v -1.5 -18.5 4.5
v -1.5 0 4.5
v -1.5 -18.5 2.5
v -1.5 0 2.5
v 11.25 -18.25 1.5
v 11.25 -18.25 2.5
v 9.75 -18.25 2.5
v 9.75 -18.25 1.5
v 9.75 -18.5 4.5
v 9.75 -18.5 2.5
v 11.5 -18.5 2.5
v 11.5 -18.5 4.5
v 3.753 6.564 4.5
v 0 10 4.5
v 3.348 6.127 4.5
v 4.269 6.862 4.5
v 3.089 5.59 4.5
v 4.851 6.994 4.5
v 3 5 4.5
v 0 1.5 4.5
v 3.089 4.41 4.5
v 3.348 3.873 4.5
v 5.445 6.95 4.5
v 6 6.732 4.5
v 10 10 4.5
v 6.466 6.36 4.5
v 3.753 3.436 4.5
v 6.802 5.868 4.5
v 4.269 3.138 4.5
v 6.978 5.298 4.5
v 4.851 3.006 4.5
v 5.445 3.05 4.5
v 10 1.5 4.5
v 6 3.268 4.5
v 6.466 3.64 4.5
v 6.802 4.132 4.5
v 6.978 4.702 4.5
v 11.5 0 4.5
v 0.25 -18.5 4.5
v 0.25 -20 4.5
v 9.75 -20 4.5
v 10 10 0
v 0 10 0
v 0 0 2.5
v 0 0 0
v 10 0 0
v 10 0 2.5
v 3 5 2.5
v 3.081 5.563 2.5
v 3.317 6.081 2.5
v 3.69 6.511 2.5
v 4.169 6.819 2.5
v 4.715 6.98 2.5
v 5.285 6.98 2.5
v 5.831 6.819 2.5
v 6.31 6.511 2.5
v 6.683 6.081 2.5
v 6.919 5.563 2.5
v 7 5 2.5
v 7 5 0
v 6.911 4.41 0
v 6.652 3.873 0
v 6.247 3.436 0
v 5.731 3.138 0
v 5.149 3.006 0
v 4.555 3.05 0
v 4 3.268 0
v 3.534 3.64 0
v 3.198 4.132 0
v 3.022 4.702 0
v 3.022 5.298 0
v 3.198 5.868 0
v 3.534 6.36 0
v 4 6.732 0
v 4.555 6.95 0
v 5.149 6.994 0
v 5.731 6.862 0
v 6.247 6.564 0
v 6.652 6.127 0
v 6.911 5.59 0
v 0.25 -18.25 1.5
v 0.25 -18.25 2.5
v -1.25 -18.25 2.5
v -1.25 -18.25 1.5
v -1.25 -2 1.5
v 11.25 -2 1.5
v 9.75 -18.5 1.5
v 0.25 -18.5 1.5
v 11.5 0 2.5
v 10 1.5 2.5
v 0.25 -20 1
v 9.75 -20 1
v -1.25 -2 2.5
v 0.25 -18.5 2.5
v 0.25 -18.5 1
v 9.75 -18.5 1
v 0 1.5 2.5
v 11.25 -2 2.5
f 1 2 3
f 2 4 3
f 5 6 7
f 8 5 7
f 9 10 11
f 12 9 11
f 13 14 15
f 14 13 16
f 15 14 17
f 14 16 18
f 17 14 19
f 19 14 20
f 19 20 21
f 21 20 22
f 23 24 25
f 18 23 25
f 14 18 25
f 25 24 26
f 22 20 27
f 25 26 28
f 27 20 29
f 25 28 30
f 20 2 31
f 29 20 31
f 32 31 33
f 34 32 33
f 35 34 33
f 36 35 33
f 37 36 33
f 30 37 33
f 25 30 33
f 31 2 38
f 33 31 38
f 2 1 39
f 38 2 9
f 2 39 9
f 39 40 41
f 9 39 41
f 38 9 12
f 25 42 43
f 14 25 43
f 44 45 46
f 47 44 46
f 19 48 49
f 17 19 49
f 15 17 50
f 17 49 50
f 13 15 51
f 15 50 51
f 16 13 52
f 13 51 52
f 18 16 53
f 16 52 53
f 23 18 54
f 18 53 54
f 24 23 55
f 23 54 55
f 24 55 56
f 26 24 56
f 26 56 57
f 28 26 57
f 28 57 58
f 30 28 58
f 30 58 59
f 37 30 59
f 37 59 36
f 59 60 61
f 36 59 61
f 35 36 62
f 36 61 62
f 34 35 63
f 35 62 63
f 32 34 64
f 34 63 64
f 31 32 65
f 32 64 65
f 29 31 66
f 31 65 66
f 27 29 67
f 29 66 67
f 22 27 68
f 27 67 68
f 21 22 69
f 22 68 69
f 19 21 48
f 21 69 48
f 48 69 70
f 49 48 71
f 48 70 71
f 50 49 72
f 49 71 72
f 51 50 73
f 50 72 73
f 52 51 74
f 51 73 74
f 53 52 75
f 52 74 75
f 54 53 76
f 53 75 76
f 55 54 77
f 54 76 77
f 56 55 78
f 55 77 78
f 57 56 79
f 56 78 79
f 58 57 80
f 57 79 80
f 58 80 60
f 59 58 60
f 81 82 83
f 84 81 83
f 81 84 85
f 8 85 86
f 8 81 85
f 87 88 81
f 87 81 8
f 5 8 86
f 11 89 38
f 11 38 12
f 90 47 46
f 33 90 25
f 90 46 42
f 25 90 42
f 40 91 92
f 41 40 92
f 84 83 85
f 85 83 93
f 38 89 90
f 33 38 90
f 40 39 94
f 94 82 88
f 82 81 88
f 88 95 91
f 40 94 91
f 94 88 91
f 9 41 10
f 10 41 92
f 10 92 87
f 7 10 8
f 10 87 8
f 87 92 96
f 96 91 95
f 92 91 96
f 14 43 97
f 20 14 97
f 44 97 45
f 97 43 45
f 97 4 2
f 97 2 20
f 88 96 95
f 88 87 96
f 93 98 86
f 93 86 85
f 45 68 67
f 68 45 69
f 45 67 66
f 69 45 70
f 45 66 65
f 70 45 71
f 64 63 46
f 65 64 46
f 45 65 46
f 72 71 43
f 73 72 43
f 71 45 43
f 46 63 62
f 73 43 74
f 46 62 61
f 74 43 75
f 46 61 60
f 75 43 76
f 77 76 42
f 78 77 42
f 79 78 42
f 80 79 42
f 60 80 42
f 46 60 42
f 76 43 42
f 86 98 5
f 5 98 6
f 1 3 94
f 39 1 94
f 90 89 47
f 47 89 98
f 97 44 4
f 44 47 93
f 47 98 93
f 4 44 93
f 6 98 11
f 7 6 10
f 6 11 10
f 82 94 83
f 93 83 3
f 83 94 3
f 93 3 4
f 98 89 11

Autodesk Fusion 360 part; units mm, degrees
sketch "Sketch1" plane through (0, 0, 0) normal (0, 0, 1) x (1, 0, 0)
  line L0 (0, 0) -> (10, 0)
  line L1 (10, 0) -> (10, 10)
  line L2 (10, 10) -> (0, 10)
  line L3 (0, 10) -> (0, 0)
  line L4 (0, 10) -> (10, 0)
  line L5 (0, 0) -> (10, 10)
  circle A0 centre (5, 5) radius 2
  dimension "d1" = 10
  dimension "d2" = 10
  dimension "d3" = 4
extrude "Extrude1" add sketch "Sketch1" along normal blind 2.5 contours L0 L4 L5 A0 | L3 L4 L5 A0 | L1 L4 L5 A0 | L2 L4 L5 A0
sketch "Sketch2" plane through (0, 0, 2.5) normal (0, 0, 1) x (-1, 0, 0)
  circle A0 centre (-5, -5) radius 2
  line L0 (0, -10) -> (0, 0)
  line L1 (0, 0) -> (-10, 0)
  line L2 (-10, 0) -> (-10, -10)
  line L3 (-10, -10) -> (0, -10)
  line L4 (0, 0) -> (-10, 0)
  line L5 (-10, 0) -> (-10, 2)
  line L6 (-10, 2) -> (0, 2)
  line L7 (0, 2) -> (0, 0)
  line L8 (0, 0) -> (-10, 0)
  line L9 (-10, 0) -> (-10, 1.5)
  line L10 (-10, 1.5) -> (0, 1.5)
  line L11 (0, 1.5) -> (0, 0)
  line L12 (-5, 0) -> (3, 0)
  line L13 (3, 0) -> (3, 1.5)
  line L14 (3, 1.5) -> (-5, 1.5)
  line L15 (-5, 1.5) -> (-5, 0)
  line L16 (-5, 0) -> (-13, 0)
  line L17 (-13, 0) -> (-13, 1.5)
  line L18 (-13, 1.5) -> (-5, 1.5)
  line L19 (-5, 1.5) -> (-5, 0)
  line L20 (3, 0) -> (1.5, 0)
  line L21 (1.5, 0) -> (1.5, 1.5)
  line L22 (1.5, 1.5) -> (3, 1.5)
  line L23 (3, 1.5) -> (3, 0)
  line L24 (3, 0) -> (1.5, 0)
  line L25 (1.5, 0) -> (1.5, 20)
  line L26 (1.5, 20) -> (3, 20)
  line L27 (3, 20) -> (3, 0)
  line L28 (-13, 0) -> (-11.5, 0)
  line L29 (-11.5, 0) -> (-11.5, 20)
  line L30 (-11.5, 20) -> (-13, 20)
  line L31 (-13, 20) -> (-13, 0)
  line L32 (1.5, 20) -> (0, 20)
  line L33 (0, 20) -> (0, 18.5)
  line L34 (0, 18.5) -> (1.5, 18.5)
  line L35 (1.5, 18.5) -> (1.5, 20)
  line L36 (-11.5, 20) -> (-10, 20)
  line L37 (-10, 20) -> (-10, 18.5)
  line L38 (-10, 18.5) -> (-11.5, 18.5)
  line L39 (-11.5, 18.5) -> (-11.5, 20)
  line L40 (1.5, 2) -> (-11.5, 2)
  line L41 (-11.5, 2) -> (-11.5, 18.5)
  line L42 (-11.5, 18.5) -> (1.5, 18.5)
  line L43 (1.5, 18.5) -> (1.5, 2)
  line L44 (1.5, 0) -> (0, -1.5)
  line L45 (1.5, 0) -> (3.6213, 0) construction
  line L46 (-11.5, 0) -> (-10, -1.5)
  dimension "d6" = 2
  dimension "d7" = 1.5
  dimension "d8" = 8
  dimension "d9" = 20
  dimension "d10" = 1.5
  dimension "d11" = 20
  dimension "d12" = 1.5
  dimension "d13" = 1.5
  dimension "d14" = 1.5
  dimension "d15" = 1.5
  dimension "d16" = 135
  dimension "d17" = 90
extrude "Extrude2" add sketch "Sketch2" along normal blind 2 contours L0 L1 L2 L3 L4 L8 L12 L16 | L0 L12 L44 | L1 L4 L7 L8 L10 L11 L12 L14 L15 L19 | L7 L11 L12 L14 L21 L25 | L2 L16 L46 | L1 L4 L5 L8 L9 L10 L15 L16 L18 L19 | L5 L6 L7 L10 L14 L18 L40 | L7 L14 L25 L40 | L5 L9 L16 L18 L29 | L6 L25 L29 L34 L38 L40 L41 L42 L43 | L5 L18 L29 L40
sketch "Sketch3" plane through (0, 0, 2.5) normal (0, 0, -1) x (1, 0, 0)
  line L0 (10, 0) -> (10, -1.5)
  line L1 (10, -1.5) -> (11.5, 0)
  line L2 (11.5, 0) -> (11.5, 18.5)
  line L3 (11.5, 18.5) -> (-1.5, 18.5)
  line L4 (-1.5, 18.5) -> (-1.5, 0)
  line L5 (-1.5, 0) -> (0, -1.5)
  line L6 (0, -1.5) -> (0, 0)
  line L7 (0, 0) -> (10, 0)
  line L8 (-1.5, 0) -> (11.5, 0)
  line L9 (11.5, 0) -> (11.5, -1.5)
  line L10 (11.5, -1.5) -> (-1.5, -1.5)
  line L11 (-1.5, -1.5) -> (-1.5, 0)
  line L12 (-1.5, 0) -> (11.5, 0)
  line L13 (11.5, 0) -> (11.5, 2)
  line L14 (11.5, 2) -> (-1.5, 2)
  line L15 (-1.5, 2) -> (-1.5, 0)
  line L16 (-1.5, 18.5) -> (-1, 18.5)
  line L17 (-1, 2) -> (-1.5, 2)
  line L18 (-1.5, 2) -> (-1.5, 18.5)
  line L19 (11.5, 18.5) -> (11, 18.5)
  line L20 (11, 2) -> (11.5, 2)
  line L21 (11.5, 2) -> (11.5, 18.5)
  line L22 (-1.5, 18.5) -> (0, 18.5)
  line L23 (0, 18.5) -> (0, 20)
  line L24 (0, 20) -> (-1.5, 20)
  line L25 (-1.5, 20) -> (-1.5, 18.5)
  line L26 (11.5, 18.5) -> (10, 18.5)
  line L27 (10, 18.5) -> (10, 20)
  line L28 (10, 20) -> (11.5, 20)
  line L29 (11.5, 20) -> (11.5, 18.5)
  line L30 (10, 20) -> (9.75, 20)
  line L31 (9.75, 20) -> (9.75, 18.5)
  line L32 (9.75, 18.5) -> (10, 18.5)
  line L33 (10, 18.5) -> (10, 20)
  line L34 (0, 20) -> (0.25, 20)
  line L35 (0.25, 20) -> (0.25, 18.5)
  line L36 (0.25, 18.5) -> (0, 18.5)
  line L37 (0, 18.5) -> (0, 20)
  line L38 (-1.5, 20) -> (-1.25, 20)
  line L39 (-1.25, 20) -> (-1.25, 2)
  line L40 (-1.25, 2) -> (-1.5, 2)
  line L41 (-1.5, 2) -> (-1.5, 20)
  line L42 (11.5, 2) -> (11.25, 2)
  line L43 (11.25, 2) -> (11.25, 18.5)
  line L44 (11.25, 18.5) -> (11.5, 18.5)
  line L45 (11.5, 18.5) -> (11.5, 2)
  line L46 (-1.5, 18.5) -> (0.25, 18.5)
  line L47 (0.25, 18.5) -> (0.25, 18.25)
  line L48 (0.25, 18.25) -> (-1.5, 18.25)
  line L49 (-1.5, 18.25) -> (-1.5, 18.5)
  line L50 (9.75, 18.5) -> (11.25, 18.5)
  line L51 (11.25, 18.5) -> (11.25, 18.25)
  line L52 (11.25, 18.25) -> (9.75, 18.25)
  line L53 (9.75, 18.25) -> (9.75, 18.5)
  line L54 (0.25, 20) -> (9.75, 20)
  line L55 (9.75, 20) -> (9.75, 18.5)
  line L56 (9.75, 18.5) -> (0.25, 18.5)
  line L57 (0.25, 18.5) -> (0.25, 20)
  dimension "d20" = 13
  dimension "d21" = 2
  dimension "d22" = 0.5
  dimension "d23" = 0.5
  dimension "d24" = 1.5
  dimension "d25" = 1.5
  dimension "d26" = 1.5
  dimension "d27" = 1.5
  dimension "d28" = 0.25
  dimension "d29" = 0.25
  dimension "d30" = 0.25
  dimension "d31" = 0.25
  dimension "d32" = 0.25
  dimension "d33" = 0.25
extrude "Extrude3" add sketch "Sketch3" along normal blind 1 contours L3 L14 L17 L20 L39 L43 L47 L48 L52 L53 L56 | L3 L31 L35 L54 L55 L56 L57
sketch "Sketch4" plane through (0, 0, 1.5) normal (0, 0, -1) x (1, 0, 0)
  line L0 (0.25, 18.25) -> (-1.25, 18.25)
  line L1 (-1.25, 18.25) -> (-1.25, 2)
  line L2 (-1.25, 2) -> (11.25, 2)
  line L3 (11.25, 2) -> (11.25, 18.25)
  line L4 (11.25, 18.25) -> (9.75, 18.25)
  line L5 (9.75, 18.25) -> (9.75, 20)
  line L6 (9.75, 20) -> (0.25, 20)
  line L7 (0.25, 20) -> (0.25, 18.25)
  line L8 (0.25, 20) -> (9.75, 20)
  line L9 (9.75, 20) -> (9.75, 18.5)
  line L10 (9.75, 18.5) -> (0.25, 18.5)
  line L11 (0.25, 18.5) -> (0.25, 20)
  dimension "d36" = 1.5
extrude "Extrude4" add sketch "Sketch4" along normal blind 0.5 contours L5 L6 L7 L8 L9 L10 L11
extrude "Extrude5" add 1 faces at (3.4167, -19, 2.5) along direction (0, 0, 1) blind 2
